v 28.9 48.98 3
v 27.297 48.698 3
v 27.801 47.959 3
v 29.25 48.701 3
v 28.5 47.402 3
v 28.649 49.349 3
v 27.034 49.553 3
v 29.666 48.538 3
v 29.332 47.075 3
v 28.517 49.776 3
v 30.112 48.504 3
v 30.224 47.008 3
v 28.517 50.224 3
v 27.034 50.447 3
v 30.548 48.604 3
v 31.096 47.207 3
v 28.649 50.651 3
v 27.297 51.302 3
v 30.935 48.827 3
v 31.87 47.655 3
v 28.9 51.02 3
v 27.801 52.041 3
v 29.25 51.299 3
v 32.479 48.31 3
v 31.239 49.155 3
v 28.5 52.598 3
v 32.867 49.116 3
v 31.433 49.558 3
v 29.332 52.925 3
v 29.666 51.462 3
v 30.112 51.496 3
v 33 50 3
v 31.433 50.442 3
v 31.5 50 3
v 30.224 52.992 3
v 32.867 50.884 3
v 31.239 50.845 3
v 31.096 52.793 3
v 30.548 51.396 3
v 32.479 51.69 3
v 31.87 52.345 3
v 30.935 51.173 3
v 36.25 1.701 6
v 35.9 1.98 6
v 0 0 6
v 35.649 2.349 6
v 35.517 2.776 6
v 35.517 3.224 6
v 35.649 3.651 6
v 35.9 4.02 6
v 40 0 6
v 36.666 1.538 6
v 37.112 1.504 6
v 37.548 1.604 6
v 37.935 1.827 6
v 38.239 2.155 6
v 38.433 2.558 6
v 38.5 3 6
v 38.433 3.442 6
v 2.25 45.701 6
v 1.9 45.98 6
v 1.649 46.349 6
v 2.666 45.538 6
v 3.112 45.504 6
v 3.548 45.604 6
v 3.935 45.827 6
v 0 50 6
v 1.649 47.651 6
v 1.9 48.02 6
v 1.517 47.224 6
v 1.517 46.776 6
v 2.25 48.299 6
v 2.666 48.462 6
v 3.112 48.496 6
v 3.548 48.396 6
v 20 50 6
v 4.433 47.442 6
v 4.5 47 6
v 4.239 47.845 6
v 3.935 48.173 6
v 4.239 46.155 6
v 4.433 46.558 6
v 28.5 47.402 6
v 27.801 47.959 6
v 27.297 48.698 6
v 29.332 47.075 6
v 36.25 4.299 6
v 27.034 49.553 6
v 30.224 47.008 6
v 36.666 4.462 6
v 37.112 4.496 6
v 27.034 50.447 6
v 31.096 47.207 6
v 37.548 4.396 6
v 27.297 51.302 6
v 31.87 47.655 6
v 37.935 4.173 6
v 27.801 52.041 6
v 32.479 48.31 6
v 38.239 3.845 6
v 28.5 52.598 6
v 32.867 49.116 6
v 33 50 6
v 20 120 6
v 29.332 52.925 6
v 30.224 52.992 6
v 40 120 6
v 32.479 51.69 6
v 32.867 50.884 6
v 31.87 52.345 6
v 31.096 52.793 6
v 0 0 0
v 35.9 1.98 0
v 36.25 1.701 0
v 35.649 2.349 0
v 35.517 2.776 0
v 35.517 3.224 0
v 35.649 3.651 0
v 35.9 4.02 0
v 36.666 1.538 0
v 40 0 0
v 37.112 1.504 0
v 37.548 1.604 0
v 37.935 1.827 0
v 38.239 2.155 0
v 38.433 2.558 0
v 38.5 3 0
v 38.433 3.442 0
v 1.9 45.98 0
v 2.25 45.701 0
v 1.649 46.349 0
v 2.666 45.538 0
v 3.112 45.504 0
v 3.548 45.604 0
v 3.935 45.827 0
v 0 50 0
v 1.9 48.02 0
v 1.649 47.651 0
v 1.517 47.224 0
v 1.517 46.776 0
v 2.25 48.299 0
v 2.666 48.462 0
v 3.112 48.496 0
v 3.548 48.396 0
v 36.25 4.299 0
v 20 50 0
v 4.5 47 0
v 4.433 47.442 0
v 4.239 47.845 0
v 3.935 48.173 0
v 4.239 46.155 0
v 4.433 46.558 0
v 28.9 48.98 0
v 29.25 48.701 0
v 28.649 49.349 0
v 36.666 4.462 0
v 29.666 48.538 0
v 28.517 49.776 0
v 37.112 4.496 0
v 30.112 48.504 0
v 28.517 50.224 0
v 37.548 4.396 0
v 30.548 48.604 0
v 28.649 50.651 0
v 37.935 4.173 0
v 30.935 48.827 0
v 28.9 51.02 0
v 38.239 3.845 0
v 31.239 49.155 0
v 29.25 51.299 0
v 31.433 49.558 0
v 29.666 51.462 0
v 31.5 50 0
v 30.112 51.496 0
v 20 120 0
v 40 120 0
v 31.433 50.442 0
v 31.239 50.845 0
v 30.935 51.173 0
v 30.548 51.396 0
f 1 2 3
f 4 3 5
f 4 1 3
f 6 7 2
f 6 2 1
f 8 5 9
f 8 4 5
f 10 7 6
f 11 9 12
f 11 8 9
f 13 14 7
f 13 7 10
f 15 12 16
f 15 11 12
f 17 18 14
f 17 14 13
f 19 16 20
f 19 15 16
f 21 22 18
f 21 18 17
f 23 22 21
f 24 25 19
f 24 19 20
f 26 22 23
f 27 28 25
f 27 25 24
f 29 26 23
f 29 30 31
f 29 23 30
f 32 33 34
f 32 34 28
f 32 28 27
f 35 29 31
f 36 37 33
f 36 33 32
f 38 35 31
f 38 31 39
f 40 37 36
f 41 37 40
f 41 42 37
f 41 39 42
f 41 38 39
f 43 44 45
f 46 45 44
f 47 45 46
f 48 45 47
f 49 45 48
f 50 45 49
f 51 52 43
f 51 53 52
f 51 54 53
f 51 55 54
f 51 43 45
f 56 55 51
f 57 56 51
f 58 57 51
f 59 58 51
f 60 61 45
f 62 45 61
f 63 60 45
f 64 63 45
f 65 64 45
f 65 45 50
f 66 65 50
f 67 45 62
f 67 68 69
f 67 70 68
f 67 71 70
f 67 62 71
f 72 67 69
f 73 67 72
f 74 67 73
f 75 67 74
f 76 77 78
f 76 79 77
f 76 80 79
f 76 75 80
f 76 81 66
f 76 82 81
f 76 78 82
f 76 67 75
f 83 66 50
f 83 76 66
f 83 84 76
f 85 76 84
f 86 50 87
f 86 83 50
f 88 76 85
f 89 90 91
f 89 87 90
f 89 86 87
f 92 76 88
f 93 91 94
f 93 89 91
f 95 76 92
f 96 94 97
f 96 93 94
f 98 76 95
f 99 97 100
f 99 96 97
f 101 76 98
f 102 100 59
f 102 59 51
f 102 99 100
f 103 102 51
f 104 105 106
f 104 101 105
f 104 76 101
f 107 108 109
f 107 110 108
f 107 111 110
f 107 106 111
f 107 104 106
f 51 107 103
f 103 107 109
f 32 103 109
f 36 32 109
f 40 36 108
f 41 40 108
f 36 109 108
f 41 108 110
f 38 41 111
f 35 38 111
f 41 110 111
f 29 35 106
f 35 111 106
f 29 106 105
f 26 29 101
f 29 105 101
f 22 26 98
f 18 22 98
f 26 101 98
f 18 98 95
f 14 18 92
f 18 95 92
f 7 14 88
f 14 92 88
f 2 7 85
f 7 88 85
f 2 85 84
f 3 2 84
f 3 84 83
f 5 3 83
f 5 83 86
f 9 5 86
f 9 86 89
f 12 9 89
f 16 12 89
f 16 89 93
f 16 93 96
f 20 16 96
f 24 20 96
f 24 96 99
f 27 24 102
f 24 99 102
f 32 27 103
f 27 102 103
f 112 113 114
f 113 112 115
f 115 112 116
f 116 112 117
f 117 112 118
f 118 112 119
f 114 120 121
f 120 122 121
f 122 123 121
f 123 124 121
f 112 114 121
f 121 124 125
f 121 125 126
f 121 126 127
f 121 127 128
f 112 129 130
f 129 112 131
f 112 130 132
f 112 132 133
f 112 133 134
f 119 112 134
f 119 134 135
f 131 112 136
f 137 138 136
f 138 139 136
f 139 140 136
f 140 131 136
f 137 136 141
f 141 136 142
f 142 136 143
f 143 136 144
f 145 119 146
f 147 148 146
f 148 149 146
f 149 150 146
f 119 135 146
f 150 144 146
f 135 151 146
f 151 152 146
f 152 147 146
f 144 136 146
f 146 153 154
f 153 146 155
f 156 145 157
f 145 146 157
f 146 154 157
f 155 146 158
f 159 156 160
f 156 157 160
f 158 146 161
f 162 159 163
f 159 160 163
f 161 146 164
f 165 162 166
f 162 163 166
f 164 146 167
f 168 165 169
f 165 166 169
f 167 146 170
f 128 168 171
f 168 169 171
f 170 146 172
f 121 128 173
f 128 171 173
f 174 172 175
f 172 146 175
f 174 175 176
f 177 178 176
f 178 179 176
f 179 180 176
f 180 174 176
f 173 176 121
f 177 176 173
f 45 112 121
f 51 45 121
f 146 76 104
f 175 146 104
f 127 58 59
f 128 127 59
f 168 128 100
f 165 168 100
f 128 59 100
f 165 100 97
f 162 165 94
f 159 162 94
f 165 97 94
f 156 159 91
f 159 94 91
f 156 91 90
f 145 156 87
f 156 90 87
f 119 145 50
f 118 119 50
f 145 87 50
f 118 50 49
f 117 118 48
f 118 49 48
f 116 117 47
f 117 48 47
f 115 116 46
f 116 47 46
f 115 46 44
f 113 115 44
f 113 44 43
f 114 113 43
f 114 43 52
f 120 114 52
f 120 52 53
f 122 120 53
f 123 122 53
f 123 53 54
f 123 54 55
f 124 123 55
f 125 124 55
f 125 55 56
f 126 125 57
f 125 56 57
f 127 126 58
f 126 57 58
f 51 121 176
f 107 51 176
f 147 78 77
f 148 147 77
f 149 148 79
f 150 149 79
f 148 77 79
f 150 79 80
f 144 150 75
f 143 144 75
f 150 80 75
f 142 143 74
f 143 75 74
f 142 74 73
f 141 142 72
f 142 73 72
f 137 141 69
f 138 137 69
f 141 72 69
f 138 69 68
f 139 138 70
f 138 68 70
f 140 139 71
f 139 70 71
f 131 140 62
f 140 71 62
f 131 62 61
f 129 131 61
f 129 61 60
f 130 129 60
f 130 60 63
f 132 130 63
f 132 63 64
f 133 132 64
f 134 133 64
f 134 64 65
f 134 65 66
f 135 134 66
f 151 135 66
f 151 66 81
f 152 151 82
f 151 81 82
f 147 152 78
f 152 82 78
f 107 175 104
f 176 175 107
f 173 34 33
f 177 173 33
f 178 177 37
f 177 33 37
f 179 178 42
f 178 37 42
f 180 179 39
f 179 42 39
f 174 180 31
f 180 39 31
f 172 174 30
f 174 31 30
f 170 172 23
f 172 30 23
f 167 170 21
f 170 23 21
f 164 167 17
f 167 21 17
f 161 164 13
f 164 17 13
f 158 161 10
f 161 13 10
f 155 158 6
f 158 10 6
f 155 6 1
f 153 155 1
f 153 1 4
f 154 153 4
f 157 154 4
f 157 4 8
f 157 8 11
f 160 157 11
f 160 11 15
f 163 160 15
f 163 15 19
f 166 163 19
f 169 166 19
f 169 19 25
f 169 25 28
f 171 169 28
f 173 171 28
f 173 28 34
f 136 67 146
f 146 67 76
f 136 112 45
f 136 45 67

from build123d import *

# Parameters (mm, degrees)
ESQUISSE1_W             = 40
ESQUISSE1_H             = 120
BOSS_EXTRU_1_DEPTH      = 6
ESQUISSE2_W             = 20
ESQUISSE2_H             = 70
ENL_V_MAT_EXTRU_1_DEPTH = 6
ESQUISSE4_R             = 1.5
ENL_V_MAT_EXTRU_2_DEPTH = 6
ESQUISSE5_R             = 3
ENL_V_MAT_EXTRU_3_DEPTH = 3


with BuildPart() as part:
    # Esquisse1 → Boss.-Extru.1 (new body)
    with BuildSketch(Plane.XY):
        with Locations((20, 60)):
            Rectangle(ESQUISSE1_W, ESQUISSE1_H)
    extrude(amount=BOSS_EXTRU_1_DEPTH)

    # Esquisse2 → Enlèv. mat.-Extru.1 (cut)
    with BuildSketch(Plane.XY.offset(6)):
        with Locations((10, 85)):
            Rectangle(ESQUISSE2_W, ESQUISSE2_H)
    extrude(amount=-ENL_V_MAT_EXTRU_1_DEPTH, mode=Mode.SUBTRACT)

    # Esquisse4 → Enlèv. mat.-Extru.2 (cut)
    with BuildSketch(Plane.XY.offset(6)):
        with Locations((3, 47)):
            Circle(ESQUISSE4_R)
        with Locations((37, 3)):
            Circle(ESQUISSE4_R)
        with Locations((30, 50)):
            Circle(ESQUISSE4_R)
    extrude(amount=-ENL_V_MAT_EXTRU_2_DEPTH, mode=Mode.SUBTRACT)

    # Esquisse5 → Enlèv. mat.-Extru.3 (cut)
    with BuildSketch(Plane.XY.offset(6)):
        with Locations((30, 50)):
            Circle(ESQUISSE5_R)
    extrude(amount=-ENL_V_MAT_EXTRU_3_DEPTH, mode=Mode.SUBTRACT)


solid = part.part
